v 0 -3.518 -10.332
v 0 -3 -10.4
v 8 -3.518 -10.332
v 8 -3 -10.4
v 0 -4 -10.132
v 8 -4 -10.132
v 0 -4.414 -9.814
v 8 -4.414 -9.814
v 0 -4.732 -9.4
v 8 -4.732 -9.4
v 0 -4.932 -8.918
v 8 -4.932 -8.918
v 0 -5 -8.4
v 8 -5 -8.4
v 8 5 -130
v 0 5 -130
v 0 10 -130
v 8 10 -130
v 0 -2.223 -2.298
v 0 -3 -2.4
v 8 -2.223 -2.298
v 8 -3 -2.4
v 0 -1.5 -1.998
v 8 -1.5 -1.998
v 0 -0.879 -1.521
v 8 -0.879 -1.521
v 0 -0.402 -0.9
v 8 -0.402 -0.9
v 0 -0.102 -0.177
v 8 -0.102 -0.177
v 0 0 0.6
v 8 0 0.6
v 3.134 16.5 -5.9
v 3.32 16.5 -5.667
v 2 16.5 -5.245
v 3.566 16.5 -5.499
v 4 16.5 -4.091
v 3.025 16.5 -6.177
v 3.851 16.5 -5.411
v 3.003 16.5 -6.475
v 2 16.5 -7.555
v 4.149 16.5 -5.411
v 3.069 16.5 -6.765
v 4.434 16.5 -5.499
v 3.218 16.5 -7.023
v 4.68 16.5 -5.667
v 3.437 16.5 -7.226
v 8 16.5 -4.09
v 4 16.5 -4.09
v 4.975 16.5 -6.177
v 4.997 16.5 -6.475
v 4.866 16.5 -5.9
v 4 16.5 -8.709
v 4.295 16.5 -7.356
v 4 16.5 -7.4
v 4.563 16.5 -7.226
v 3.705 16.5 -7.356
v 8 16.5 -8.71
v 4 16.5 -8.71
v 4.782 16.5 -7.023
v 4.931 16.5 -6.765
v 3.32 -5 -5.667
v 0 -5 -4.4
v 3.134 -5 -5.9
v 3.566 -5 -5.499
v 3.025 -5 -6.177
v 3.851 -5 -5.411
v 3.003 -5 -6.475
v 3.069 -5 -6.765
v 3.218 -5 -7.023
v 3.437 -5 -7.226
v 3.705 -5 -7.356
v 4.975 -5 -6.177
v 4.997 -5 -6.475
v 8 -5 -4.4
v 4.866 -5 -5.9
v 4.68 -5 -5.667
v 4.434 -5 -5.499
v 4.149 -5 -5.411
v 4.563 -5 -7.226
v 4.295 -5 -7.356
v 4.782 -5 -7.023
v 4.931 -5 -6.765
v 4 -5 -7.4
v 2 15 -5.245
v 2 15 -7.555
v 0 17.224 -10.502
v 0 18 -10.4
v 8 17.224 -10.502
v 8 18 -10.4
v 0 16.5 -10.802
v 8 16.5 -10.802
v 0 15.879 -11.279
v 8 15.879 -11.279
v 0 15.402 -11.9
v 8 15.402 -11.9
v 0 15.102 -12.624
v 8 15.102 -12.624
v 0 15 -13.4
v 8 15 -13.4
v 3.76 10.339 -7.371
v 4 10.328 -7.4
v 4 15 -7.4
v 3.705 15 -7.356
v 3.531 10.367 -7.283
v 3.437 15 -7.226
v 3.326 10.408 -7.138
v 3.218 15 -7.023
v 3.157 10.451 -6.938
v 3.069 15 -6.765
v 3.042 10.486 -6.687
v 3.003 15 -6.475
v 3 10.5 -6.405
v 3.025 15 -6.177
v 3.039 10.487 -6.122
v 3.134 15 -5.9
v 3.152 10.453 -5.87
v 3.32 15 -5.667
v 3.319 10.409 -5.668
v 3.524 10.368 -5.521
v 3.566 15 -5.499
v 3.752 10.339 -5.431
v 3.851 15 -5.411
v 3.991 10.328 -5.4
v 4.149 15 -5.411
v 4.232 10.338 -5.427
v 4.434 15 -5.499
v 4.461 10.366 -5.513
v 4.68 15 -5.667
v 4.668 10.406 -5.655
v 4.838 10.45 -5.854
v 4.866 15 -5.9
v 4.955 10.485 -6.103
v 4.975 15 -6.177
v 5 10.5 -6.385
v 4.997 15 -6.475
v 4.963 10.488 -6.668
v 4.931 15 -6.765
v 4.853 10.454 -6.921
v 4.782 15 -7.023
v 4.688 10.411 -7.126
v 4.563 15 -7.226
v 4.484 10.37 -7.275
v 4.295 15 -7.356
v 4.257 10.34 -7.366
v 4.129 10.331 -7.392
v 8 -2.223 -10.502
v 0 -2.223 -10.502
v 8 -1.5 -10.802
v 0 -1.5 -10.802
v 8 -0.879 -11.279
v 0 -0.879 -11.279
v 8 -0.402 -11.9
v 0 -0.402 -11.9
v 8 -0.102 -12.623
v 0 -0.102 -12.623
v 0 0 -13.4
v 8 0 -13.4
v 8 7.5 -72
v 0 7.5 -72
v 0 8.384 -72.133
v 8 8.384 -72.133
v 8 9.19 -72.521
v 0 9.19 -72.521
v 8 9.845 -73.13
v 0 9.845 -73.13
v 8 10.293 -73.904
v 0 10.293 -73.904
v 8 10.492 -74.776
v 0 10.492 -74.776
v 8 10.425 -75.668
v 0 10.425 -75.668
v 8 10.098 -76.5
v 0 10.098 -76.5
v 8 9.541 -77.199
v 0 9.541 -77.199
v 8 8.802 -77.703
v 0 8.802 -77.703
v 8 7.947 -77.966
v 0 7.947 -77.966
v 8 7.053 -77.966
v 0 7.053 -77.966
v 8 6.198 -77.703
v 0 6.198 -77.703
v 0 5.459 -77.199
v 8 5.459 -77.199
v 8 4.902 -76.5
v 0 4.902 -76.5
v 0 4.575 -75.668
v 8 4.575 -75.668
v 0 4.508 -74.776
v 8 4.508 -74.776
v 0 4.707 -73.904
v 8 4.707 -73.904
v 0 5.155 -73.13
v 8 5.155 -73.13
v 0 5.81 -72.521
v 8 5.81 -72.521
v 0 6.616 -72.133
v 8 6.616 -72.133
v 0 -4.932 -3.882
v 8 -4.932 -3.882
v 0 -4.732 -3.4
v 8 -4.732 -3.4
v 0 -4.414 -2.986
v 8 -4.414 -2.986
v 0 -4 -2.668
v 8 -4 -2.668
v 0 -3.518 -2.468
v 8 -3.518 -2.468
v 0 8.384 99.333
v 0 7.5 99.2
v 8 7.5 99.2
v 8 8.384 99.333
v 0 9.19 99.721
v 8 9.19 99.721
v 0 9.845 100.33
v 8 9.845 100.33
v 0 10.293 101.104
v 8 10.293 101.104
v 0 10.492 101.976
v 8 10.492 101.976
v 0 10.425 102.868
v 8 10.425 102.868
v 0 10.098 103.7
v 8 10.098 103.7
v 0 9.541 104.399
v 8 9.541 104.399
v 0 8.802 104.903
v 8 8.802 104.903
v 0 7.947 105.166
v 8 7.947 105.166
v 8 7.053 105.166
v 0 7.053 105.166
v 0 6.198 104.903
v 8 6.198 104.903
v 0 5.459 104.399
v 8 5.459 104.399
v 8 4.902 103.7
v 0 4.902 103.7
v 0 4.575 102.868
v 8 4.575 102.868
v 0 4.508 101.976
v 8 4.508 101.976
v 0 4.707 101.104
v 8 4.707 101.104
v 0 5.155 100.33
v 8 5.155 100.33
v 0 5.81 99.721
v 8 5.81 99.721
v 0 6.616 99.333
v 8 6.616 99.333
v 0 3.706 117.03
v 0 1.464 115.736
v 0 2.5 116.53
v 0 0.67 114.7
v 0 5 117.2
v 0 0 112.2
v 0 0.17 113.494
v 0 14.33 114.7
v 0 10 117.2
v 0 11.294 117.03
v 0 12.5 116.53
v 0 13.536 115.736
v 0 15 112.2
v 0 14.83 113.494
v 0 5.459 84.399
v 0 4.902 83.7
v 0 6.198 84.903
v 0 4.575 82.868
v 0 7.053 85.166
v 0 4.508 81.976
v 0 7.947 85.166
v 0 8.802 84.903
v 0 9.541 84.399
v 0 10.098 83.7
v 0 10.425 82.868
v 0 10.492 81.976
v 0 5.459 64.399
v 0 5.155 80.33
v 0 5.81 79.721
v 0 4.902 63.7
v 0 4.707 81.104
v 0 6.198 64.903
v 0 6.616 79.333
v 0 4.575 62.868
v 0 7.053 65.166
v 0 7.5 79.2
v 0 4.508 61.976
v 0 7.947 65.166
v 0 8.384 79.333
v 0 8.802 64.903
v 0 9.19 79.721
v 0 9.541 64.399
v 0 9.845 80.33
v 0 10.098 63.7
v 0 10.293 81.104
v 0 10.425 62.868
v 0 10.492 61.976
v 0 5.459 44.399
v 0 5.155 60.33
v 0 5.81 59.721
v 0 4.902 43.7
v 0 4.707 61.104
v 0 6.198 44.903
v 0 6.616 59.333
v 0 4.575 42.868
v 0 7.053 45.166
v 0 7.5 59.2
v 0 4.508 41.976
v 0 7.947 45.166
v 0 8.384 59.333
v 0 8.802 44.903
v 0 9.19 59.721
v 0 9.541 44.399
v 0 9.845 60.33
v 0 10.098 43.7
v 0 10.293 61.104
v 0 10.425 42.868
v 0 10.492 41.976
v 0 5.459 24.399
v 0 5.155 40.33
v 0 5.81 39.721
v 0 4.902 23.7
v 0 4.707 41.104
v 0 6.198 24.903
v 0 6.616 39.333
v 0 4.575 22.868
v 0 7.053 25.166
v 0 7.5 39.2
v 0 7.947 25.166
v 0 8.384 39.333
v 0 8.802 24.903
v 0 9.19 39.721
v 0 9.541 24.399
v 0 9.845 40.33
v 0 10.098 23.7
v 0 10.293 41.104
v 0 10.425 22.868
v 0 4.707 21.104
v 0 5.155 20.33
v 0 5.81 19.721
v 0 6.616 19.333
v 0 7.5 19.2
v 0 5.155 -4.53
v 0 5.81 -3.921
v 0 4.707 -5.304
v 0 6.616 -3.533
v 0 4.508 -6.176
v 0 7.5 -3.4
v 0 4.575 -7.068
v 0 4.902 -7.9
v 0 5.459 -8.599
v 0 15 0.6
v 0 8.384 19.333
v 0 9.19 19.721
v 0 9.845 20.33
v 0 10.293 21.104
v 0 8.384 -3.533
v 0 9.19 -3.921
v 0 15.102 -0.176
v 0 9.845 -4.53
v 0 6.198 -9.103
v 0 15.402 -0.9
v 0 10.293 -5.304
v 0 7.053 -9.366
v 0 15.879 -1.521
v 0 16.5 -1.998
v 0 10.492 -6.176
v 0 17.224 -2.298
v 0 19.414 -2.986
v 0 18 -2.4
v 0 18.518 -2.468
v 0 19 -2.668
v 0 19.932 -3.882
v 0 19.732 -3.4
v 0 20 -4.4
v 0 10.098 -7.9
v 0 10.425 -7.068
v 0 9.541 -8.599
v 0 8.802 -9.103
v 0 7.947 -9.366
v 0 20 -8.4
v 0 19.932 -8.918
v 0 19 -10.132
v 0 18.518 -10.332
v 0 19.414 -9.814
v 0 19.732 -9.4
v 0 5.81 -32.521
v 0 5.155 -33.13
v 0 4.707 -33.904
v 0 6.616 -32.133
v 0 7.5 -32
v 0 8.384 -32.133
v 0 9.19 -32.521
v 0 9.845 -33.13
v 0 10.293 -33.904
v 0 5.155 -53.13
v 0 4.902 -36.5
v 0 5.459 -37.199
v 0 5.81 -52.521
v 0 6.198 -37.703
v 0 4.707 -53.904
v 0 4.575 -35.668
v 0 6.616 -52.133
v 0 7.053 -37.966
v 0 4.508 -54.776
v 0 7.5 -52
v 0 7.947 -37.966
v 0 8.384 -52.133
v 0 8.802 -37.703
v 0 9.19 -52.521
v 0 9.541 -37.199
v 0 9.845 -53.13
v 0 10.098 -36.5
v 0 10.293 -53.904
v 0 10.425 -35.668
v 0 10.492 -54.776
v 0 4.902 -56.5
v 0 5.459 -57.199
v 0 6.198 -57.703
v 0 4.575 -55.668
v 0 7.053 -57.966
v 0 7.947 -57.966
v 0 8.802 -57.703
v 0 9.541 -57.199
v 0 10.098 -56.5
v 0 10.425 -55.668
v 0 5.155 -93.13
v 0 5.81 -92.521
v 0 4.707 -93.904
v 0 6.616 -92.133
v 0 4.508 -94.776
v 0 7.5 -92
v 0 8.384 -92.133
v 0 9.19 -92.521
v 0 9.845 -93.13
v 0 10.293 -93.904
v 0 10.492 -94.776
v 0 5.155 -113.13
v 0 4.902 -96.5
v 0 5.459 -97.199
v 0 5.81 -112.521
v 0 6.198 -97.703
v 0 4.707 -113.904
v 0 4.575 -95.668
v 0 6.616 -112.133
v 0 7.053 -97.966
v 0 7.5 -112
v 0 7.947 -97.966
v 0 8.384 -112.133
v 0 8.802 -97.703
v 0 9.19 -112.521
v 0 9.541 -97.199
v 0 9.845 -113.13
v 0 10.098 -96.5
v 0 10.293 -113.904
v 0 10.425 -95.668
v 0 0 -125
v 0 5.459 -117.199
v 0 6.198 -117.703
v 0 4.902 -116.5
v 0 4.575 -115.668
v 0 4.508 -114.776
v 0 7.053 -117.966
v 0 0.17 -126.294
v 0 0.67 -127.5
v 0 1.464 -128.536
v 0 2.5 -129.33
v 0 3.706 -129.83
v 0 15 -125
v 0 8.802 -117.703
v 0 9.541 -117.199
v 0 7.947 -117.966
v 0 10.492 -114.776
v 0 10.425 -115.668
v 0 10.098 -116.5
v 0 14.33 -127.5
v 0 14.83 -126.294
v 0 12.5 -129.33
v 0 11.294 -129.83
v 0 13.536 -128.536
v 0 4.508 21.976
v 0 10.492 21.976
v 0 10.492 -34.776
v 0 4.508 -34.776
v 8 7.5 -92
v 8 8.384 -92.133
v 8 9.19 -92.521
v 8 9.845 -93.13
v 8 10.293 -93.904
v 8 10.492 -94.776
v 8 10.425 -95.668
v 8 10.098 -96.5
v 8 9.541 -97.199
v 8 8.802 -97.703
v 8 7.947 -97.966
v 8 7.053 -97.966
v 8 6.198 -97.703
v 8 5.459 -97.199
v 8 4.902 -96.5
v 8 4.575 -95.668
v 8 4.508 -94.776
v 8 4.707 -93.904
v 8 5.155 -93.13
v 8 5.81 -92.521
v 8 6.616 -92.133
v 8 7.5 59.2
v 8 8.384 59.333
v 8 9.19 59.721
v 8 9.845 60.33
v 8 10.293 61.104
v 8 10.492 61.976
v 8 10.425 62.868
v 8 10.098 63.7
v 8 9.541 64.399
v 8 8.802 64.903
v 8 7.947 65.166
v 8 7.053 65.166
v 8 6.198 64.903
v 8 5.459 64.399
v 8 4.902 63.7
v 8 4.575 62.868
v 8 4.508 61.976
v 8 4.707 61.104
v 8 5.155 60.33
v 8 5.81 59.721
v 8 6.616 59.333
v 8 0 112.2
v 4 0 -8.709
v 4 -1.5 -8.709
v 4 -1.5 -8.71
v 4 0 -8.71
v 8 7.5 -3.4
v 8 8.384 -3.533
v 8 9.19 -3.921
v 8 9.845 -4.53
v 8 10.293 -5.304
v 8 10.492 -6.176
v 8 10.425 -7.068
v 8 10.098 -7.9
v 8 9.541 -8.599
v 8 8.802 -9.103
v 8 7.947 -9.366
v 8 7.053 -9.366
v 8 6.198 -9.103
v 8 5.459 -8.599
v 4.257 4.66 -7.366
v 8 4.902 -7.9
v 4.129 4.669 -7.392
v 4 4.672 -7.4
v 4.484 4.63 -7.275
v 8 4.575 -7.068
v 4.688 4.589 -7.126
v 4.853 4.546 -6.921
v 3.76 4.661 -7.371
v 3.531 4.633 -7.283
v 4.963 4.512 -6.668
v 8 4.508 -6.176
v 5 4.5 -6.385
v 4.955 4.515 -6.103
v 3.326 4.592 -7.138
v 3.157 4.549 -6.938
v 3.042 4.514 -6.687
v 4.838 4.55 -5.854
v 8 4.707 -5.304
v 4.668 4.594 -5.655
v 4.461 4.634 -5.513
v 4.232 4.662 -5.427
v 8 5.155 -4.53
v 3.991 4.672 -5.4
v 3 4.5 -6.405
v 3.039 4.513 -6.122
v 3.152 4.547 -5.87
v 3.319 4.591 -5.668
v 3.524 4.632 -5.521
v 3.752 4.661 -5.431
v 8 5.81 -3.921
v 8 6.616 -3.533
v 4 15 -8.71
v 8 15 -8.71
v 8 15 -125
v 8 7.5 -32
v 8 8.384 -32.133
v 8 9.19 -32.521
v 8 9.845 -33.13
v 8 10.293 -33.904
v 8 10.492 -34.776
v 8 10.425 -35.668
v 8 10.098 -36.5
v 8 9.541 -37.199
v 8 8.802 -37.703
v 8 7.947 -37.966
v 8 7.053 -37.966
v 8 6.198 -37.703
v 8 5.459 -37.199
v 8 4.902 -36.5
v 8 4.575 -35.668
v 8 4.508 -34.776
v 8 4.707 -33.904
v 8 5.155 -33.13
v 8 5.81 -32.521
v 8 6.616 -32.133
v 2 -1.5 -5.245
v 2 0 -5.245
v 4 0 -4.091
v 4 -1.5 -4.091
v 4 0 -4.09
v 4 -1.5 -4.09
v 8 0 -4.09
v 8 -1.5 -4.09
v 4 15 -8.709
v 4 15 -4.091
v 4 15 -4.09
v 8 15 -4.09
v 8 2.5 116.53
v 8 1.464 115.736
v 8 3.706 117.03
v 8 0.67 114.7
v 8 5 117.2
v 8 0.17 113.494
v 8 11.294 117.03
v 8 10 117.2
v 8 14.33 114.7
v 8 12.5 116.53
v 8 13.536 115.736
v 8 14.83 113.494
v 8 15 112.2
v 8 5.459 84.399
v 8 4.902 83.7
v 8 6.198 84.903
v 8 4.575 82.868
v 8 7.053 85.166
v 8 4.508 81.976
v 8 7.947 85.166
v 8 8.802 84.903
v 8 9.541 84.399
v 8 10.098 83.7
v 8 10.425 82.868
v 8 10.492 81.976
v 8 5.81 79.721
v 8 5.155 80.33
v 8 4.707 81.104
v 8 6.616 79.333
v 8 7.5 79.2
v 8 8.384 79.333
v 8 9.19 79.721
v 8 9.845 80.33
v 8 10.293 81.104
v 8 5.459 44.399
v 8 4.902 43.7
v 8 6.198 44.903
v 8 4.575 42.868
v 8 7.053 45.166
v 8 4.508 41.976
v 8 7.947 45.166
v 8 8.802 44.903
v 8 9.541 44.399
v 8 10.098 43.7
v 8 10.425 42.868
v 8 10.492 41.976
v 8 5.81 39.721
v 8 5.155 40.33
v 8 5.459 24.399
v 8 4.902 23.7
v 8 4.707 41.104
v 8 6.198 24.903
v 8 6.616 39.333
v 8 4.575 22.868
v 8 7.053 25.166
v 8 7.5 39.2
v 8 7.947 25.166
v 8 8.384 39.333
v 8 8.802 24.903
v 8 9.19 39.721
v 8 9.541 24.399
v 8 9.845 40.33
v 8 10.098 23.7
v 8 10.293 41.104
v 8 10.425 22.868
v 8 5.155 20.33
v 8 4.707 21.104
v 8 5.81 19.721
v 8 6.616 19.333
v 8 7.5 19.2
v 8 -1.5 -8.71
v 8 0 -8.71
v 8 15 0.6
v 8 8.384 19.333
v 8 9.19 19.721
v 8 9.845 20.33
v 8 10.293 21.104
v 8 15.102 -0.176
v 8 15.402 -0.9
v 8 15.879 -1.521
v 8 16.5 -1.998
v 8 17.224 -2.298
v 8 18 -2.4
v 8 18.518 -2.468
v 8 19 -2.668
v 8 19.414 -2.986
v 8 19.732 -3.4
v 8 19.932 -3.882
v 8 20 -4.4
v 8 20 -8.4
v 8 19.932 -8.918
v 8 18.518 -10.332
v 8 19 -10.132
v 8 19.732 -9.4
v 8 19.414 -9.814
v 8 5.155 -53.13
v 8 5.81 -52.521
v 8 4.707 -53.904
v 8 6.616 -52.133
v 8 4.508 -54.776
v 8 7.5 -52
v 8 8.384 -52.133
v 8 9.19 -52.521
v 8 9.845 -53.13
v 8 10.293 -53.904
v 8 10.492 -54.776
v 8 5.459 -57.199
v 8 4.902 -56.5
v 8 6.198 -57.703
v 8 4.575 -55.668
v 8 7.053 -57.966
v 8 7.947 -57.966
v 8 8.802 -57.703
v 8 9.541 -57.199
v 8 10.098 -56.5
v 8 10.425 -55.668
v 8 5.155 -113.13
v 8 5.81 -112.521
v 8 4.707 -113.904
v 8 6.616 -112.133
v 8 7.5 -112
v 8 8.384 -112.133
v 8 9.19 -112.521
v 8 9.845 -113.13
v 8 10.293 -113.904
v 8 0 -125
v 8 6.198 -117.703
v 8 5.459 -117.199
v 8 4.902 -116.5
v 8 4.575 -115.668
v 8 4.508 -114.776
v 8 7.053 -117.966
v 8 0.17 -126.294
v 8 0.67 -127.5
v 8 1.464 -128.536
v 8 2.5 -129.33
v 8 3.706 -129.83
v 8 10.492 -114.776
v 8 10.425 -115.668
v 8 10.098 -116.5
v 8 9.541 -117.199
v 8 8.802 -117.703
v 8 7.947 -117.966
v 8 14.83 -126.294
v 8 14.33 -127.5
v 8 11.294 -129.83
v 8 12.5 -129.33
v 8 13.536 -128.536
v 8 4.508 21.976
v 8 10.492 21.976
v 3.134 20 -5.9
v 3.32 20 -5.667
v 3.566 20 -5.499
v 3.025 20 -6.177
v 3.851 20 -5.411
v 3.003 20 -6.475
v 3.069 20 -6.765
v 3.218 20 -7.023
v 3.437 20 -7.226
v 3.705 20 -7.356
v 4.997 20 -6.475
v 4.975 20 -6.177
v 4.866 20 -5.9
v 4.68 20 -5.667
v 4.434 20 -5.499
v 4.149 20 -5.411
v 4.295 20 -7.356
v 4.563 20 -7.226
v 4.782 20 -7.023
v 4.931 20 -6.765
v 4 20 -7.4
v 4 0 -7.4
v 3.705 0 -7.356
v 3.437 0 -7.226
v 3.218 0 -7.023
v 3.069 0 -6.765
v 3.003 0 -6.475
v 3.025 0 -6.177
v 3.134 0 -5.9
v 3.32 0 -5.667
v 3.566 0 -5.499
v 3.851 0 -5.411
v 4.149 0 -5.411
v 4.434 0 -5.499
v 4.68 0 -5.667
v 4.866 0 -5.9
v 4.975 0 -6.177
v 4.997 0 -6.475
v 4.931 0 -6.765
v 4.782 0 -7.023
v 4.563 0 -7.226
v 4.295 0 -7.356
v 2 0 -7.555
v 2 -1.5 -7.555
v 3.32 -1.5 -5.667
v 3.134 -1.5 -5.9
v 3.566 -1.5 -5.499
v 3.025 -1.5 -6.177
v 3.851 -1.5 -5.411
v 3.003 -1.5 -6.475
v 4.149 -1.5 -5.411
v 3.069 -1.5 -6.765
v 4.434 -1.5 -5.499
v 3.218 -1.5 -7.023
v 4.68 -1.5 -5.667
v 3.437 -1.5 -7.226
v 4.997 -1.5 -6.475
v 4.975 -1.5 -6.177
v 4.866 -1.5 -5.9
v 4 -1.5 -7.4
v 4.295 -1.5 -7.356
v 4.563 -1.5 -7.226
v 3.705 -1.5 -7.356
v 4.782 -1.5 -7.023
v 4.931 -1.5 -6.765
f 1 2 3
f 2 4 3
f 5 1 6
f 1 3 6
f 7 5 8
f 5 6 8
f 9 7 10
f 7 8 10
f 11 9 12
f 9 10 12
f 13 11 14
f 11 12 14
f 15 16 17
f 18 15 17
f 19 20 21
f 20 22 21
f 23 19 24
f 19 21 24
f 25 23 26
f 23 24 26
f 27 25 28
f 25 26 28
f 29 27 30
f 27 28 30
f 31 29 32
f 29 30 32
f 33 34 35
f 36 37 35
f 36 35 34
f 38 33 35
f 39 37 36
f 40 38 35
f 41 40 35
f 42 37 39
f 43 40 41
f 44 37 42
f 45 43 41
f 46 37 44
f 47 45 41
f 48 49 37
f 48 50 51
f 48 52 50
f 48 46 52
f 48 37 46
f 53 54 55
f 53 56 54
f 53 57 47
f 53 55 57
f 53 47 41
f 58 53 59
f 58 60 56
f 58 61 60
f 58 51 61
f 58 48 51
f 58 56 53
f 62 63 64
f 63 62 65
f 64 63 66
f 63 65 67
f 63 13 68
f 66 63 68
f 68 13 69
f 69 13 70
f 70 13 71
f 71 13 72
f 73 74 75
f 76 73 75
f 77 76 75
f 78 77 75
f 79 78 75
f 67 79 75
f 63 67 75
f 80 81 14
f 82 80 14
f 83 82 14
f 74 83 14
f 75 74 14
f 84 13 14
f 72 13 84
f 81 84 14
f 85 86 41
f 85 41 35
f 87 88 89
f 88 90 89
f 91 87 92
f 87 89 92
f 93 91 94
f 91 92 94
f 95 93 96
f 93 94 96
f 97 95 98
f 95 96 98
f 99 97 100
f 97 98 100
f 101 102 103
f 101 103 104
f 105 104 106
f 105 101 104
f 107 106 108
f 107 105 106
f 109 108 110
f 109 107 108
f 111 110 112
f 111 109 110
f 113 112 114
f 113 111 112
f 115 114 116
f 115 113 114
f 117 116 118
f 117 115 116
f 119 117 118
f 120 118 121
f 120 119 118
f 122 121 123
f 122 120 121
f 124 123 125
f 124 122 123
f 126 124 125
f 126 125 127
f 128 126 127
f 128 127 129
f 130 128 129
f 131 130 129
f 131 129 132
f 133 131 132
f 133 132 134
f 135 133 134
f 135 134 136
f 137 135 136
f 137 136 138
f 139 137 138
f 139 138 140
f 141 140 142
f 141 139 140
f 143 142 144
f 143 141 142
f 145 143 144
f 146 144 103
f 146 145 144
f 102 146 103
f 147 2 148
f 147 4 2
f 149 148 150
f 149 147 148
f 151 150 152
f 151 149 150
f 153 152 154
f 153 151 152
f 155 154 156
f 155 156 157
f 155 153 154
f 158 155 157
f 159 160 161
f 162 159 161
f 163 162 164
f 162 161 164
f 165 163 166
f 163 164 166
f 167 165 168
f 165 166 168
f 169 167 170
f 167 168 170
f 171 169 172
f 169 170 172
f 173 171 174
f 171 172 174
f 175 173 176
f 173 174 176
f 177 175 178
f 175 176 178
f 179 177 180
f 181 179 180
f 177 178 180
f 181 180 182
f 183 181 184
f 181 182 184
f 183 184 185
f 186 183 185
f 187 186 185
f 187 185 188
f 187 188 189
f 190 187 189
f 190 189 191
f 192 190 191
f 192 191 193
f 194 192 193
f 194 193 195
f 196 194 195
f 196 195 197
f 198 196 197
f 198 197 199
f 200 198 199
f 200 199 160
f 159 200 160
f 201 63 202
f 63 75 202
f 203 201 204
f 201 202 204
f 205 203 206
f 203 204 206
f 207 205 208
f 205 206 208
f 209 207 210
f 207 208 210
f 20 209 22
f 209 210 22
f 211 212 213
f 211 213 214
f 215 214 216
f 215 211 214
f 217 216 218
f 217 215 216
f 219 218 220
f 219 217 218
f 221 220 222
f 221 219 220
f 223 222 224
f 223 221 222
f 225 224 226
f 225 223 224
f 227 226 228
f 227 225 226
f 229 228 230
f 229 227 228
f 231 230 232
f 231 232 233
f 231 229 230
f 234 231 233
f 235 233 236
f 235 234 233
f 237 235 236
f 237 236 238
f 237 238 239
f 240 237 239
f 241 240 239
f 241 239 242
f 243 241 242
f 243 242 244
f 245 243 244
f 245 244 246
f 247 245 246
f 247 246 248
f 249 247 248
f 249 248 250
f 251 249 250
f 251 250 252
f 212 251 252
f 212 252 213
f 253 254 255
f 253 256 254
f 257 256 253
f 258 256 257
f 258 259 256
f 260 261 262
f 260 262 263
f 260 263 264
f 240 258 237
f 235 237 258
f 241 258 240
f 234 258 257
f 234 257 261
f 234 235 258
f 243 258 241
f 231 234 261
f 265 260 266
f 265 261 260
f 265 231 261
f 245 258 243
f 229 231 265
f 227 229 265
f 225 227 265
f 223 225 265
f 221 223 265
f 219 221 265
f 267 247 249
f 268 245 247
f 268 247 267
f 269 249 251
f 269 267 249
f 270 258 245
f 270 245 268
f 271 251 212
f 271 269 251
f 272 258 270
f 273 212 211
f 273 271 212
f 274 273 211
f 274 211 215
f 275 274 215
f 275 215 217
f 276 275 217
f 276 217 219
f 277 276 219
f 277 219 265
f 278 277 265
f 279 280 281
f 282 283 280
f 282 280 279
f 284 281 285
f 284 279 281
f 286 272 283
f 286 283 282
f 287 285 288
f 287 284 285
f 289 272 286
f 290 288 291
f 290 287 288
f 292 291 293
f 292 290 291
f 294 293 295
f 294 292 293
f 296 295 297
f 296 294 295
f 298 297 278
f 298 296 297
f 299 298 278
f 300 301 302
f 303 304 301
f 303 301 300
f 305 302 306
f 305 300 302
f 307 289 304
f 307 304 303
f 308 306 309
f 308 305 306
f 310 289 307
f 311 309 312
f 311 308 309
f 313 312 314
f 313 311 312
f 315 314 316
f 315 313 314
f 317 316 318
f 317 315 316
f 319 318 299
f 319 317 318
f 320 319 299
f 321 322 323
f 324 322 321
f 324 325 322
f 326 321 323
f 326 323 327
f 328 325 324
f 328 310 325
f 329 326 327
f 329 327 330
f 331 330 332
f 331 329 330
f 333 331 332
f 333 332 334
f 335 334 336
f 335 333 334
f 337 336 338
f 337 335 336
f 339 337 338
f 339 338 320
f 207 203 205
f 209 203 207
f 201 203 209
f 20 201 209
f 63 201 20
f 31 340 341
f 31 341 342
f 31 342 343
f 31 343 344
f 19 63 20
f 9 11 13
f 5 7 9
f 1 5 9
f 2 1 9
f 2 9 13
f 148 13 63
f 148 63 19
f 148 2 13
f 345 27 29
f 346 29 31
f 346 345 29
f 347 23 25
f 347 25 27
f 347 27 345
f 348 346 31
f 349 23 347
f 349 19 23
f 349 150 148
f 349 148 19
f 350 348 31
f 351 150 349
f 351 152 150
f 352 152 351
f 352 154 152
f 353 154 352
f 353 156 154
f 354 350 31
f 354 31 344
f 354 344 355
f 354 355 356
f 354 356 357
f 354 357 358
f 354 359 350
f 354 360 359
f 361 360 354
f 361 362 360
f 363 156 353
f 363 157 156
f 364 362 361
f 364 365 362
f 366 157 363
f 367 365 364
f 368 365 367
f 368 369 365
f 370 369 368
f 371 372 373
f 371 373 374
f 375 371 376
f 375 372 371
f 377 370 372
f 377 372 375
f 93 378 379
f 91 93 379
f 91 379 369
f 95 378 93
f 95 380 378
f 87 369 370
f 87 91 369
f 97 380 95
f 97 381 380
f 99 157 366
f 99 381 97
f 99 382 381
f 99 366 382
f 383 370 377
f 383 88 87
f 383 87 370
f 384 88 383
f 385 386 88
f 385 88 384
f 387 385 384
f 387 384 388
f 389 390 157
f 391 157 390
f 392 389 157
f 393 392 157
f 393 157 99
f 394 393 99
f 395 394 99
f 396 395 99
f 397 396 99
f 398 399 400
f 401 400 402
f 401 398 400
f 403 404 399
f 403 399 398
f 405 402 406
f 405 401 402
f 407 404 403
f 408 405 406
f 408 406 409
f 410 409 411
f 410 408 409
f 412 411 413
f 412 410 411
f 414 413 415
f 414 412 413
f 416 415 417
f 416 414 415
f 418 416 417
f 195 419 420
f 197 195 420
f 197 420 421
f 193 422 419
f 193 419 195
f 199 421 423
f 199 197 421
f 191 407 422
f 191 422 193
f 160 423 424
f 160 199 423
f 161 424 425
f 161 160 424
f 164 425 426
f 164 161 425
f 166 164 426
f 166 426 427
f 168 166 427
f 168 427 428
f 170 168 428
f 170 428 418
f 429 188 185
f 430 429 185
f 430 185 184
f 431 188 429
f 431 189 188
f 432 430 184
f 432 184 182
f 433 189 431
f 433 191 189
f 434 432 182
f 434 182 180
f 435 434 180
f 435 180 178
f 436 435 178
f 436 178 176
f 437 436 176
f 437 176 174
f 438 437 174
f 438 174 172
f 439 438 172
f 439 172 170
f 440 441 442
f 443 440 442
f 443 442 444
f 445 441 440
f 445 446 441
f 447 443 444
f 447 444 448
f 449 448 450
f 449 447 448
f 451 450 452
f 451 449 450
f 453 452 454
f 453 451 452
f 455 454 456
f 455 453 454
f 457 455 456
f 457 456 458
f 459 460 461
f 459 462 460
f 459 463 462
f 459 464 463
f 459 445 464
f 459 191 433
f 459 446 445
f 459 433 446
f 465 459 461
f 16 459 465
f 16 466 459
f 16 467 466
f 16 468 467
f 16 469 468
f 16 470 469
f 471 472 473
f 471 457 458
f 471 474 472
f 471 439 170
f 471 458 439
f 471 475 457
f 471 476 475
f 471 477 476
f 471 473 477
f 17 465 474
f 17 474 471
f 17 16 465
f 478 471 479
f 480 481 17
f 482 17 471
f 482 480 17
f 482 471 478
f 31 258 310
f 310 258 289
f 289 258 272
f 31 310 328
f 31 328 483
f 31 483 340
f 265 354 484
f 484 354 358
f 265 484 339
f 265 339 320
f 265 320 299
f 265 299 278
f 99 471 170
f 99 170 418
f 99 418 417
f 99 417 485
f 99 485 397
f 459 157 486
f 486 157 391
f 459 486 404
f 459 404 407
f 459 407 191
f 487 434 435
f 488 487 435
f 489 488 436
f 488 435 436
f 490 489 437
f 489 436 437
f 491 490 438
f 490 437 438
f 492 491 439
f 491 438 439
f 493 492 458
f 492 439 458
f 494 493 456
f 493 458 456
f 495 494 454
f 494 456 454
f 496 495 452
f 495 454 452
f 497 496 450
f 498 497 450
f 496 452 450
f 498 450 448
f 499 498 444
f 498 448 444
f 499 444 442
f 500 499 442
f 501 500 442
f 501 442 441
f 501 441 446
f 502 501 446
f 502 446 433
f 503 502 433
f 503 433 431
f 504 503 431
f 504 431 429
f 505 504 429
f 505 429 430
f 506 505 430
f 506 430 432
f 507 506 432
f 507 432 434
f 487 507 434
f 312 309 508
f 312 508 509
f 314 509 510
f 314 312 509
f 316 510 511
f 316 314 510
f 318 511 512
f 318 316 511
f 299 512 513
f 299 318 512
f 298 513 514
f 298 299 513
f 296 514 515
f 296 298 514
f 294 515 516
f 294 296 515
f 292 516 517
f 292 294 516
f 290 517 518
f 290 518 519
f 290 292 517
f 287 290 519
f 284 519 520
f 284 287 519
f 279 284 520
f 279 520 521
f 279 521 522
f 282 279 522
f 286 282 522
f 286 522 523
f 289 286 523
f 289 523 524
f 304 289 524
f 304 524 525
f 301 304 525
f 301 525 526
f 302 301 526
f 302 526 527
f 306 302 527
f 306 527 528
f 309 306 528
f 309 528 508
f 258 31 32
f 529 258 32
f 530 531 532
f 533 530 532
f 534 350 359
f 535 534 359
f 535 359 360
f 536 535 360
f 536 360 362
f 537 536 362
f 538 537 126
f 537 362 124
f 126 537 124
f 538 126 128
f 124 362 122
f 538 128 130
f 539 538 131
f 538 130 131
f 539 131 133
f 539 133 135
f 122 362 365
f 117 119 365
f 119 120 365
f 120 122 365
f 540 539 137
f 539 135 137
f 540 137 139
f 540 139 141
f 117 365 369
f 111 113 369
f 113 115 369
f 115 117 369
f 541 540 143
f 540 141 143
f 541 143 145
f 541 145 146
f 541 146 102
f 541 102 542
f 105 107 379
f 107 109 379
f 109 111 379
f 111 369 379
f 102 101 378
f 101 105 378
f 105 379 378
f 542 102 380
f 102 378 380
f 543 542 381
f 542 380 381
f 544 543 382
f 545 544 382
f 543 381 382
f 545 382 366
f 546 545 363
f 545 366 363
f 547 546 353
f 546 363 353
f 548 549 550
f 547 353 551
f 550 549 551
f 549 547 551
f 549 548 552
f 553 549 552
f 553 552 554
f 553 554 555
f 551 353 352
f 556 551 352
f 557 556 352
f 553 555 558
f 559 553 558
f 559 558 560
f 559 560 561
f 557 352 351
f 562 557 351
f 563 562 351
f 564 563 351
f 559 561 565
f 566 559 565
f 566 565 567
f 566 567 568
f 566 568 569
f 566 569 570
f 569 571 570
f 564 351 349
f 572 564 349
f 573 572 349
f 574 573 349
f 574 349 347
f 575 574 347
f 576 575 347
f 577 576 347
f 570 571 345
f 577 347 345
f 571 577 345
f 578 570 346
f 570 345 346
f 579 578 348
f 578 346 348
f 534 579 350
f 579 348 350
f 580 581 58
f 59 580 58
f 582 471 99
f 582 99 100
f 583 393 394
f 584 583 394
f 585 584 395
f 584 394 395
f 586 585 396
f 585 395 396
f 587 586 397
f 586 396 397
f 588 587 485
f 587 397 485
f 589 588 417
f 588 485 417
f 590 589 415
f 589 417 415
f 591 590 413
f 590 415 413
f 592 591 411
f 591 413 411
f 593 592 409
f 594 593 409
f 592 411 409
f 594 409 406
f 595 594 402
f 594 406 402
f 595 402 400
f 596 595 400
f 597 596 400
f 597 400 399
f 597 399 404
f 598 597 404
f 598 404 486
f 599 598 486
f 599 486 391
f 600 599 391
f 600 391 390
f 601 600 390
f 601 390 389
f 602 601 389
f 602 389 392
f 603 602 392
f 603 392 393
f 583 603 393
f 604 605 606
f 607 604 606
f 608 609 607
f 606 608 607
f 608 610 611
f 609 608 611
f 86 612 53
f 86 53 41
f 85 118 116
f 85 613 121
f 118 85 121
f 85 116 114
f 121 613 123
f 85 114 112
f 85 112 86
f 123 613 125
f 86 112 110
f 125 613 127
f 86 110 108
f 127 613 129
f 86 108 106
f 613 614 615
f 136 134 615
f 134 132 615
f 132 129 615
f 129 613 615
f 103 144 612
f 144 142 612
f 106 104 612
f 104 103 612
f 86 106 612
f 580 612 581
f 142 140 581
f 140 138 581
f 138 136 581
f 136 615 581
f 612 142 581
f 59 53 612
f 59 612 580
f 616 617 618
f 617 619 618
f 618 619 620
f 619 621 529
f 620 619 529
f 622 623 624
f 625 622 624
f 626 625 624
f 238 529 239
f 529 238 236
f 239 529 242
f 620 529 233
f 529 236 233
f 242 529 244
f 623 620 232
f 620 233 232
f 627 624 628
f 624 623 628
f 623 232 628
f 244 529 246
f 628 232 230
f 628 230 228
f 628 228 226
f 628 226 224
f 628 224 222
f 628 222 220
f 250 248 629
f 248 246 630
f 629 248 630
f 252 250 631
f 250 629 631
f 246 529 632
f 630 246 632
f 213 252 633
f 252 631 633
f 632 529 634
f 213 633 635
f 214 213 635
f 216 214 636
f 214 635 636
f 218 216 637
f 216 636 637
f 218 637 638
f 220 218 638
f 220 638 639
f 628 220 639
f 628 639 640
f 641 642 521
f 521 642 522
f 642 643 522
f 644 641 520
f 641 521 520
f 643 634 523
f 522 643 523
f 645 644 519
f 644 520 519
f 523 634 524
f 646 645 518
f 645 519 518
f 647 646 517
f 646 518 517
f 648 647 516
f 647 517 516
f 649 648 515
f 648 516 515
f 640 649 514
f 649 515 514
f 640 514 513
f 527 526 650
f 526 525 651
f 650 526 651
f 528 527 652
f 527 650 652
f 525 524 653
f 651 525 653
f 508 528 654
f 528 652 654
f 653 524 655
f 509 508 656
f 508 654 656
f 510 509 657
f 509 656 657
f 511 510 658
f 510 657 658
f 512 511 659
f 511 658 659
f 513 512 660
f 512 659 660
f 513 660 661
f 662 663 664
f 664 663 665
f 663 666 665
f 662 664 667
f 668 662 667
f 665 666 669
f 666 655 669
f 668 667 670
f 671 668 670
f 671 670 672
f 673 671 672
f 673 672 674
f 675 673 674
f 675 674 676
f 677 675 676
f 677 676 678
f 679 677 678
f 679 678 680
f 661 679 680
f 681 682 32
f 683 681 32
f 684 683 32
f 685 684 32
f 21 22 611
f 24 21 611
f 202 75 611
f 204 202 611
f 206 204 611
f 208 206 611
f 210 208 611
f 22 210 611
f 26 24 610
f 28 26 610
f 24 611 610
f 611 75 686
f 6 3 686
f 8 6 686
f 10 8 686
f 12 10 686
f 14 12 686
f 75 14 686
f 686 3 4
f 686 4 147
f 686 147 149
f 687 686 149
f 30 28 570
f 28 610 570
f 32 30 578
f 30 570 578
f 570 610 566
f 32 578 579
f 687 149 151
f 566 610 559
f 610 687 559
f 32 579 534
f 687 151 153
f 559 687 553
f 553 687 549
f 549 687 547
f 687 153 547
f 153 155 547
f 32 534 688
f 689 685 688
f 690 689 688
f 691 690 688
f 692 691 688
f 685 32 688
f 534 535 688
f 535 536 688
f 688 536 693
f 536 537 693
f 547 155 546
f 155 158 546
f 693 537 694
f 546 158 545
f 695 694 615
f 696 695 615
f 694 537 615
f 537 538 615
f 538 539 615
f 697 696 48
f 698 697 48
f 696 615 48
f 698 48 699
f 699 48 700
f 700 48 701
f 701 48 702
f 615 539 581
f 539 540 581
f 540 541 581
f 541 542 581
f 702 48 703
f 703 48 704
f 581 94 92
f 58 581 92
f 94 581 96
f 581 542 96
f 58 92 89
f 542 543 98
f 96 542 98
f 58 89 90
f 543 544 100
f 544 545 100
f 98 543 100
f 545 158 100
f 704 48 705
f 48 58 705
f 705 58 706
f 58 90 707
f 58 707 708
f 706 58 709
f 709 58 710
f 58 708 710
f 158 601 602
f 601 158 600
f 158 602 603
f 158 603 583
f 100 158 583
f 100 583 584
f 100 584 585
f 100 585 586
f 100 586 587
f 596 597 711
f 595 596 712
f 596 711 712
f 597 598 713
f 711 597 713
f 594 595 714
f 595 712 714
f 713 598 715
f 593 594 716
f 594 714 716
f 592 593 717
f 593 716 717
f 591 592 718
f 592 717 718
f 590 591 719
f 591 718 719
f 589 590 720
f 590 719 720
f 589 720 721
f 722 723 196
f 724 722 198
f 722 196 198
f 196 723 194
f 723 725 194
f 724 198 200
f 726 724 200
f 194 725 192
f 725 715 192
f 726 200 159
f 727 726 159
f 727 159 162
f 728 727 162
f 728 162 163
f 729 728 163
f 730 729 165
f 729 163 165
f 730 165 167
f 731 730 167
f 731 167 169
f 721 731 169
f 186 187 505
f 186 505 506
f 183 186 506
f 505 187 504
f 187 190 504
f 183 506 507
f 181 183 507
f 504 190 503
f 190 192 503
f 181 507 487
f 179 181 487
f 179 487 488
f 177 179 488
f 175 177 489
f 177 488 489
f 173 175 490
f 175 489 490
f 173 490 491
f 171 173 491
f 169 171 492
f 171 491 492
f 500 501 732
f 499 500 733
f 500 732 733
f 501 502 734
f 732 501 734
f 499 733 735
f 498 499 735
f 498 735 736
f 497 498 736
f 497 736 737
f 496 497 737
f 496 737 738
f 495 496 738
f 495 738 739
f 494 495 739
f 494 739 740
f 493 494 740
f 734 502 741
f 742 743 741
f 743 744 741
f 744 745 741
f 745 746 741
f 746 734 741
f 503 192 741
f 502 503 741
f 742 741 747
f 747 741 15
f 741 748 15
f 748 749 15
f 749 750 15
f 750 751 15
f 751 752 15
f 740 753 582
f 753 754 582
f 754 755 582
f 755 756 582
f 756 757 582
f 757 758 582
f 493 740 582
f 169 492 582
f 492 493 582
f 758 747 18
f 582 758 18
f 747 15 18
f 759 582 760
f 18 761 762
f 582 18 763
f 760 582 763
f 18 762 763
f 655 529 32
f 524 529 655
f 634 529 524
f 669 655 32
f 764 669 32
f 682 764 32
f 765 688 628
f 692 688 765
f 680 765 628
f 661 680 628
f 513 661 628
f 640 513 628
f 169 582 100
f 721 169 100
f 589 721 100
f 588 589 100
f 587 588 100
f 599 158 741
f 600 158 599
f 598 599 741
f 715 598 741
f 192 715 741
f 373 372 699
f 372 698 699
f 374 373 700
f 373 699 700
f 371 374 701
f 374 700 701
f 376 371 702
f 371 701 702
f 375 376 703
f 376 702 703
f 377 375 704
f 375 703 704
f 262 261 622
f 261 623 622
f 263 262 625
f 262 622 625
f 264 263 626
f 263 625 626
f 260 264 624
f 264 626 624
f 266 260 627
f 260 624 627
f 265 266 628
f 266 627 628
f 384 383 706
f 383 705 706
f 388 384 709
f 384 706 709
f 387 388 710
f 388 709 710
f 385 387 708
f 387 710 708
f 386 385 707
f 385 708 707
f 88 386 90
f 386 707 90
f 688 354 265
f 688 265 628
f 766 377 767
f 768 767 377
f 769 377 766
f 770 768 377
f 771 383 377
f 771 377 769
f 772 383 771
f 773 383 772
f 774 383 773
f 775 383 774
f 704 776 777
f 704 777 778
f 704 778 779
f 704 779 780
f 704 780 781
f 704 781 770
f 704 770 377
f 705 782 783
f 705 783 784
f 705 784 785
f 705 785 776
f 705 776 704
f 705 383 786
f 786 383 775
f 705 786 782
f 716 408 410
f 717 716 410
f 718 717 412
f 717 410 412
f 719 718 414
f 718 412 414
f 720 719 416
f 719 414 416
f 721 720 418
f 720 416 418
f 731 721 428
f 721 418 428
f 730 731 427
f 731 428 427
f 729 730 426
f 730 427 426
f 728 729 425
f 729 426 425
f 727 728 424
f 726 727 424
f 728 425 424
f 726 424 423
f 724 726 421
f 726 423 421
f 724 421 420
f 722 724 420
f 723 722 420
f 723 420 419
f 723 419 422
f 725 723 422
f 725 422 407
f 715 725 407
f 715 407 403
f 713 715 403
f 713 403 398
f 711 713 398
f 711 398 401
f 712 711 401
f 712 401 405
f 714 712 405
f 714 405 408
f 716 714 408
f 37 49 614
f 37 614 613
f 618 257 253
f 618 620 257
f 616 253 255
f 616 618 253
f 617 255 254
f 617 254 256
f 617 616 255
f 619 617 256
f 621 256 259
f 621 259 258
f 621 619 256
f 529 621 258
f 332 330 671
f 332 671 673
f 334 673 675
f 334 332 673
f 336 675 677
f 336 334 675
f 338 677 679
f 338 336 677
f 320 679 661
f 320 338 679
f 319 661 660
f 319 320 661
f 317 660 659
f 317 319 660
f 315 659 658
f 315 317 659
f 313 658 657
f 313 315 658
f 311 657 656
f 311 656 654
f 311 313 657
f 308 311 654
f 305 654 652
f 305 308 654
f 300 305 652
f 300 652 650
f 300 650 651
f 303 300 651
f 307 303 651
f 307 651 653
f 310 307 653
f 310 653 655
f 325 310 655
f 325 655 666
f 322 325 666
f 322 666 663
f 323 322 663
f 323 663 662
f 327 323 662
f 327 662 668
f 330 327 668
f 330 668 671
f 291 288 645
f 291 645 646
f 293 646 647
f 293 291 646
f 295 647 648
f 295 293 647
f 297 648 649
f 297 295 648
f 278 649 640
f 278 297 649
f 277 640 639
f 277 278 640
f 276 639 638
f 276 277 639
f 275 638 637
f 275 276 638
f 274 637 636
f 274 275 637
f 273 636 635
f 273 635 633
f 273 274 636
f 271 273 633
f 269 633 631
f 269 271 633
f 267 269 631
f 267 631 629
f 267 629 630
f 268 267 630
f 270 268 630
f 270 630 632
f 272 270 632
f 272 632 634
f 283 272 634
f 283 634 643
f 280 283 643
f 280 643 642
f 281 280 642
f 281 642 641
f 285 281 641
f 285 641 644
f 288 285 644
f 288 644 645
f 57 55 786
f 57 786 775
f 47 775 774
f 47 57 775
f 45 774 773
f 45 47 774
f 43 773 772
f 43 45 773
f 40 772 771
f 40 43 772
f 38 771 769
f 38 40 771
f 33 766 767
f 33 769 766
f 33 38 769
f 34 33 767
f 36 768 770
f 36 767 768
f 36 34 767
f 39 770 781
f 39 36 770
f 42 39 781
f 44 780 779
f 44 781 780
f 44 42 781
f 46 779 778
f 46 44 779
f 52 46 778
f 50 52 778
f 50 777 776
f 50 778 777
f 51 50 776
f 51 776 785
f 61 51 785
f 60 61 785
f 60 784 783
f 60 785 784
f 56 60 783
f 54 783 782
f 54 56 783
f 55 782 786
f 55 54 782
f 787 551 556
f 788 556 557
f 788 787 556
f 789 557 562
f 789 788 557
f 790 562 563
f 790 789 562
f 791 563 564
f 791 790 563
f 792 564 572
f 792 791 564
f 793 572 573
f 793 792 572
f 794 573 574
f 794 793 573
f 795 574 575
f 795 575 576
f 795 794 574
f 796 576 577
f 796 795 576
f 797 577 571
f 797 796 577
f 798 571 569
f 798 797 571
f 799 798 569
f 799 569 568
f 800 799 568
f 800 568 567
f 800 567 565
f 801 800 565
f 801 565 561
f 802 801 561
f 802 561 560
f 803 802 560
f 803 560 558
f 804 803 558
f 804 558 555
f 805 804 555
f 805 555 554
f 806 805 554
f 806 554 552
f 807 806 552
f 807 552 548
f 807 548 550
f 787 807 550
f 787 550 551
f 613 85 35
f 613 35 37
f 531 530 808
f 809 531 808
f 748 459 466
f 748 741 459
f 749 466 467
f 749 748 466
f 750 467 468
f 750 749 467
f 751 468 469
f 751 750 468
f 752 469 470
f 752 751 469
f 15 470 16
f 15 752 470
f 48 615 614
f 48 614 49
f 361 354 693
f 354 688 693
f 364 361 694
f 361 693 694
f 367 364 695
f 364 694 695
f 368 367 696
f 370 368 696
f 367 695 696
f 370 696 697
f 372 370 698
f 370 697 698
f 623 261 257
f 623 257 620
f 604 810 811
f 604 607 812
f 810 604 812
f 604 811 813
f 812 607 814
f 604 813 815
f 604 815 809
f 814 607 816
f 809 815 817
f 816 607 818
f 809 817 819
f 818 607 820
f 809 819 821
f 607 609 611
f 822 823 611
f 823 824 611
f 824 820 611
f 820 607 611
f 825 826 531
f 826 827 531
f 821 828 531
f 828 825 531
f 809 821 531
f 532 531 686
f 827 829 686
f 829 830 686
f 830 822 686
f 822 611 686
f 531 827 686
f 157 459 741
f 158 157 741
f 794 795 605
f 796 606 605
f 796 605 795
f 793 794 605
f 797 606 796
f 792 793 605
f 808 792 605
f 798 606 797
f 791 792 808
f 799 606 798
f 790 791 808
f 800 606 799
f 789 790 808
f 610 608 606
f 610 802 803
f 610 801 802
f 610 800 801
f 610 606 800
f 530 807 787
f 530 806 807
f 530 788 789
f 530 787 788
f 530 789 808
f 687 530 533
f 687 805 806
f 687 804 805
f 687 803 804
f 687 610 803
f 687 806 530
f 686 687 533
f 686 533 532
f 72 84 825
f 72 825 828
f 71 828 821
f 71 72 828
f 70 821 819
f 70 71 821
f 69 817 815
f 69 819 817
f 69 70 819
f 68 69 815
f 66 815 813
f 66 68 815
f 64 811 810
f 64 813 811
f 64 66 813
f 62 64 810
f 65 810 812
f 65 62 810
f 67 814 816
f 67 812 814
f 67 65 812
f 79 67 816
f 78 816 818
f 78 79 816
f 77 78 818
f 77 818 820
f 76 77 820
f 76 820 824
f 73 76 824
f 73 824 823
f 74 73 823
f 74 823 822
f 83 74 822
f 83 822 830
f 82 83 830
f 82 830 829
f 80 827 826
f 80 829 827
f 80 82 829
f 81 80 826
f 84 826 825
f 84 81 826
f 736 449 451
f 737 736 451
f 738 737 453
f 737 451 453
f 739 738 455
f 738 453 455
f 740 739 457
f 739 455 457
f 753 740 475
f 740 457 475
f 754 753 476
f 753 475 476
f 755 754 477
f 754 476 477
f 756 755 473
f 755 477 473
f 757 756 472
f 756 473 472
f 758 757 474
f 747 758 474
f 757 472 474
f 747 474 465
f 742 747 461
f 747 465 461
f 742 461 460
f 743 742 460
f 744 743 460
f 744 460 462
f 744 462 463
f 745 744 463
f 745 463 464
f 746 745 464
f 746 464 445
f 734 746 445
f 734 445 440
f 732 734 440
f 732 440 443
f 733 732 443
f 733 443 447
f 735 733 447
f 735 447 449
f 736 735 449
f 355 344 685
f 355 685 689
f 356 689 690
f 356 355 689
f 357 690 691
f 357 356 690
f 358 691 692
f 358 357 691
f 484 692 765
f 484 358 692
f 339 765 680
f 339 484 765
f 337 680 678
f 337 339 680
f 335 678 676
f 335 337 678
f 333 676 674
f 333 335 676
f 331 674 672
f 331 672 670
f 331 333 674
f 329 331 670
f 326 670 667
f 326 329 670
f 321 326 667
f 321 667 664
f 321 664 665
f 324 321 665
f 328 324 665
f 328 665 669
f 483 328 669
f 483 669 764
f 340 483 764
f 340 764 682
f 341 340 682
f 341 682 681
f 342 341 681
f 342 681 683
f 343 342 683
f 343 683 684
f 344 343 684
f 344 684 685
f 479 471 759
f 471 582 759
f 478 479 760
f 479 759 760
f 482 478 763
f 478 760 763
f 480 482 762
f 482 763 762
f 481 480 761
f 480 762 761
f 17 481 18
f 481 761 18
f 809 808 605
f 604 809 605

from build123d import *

# Parameters (mm, degrees)
SKETCH_1_W                = 130
SKETCH_1_H                = 15
EXTRUDE_1_DEPTH           = 8
CUT_EXTRUDE_10_REACH      = 133.107
SKETCH_17_R               = 3
SKETCH_19_W               = 8
SKETCH_19_H               = 15
EXTRUDE_6_DEPTH           = 117.2
FILLET_1_R                = 5
CUT_EXTRUDE_12_REACH      = 133.107
SKETCH_15_R               = 3
SKETCH_22_W               = 8
SKETCH_22_H               = 8
EXTRUDE_7_DEPTH           = 5
CUT_EXTRUDE_18_DEPTH      = 1.5
SKETCH_25_W               = 4.62
SKETCH_25_H               = 1.5
CUT_EXTRUDE_19_DEPTH      = 4
FILLET_8_R                = 3
FILLET_9_R                = 2
FILLET_10_R               = 2
FILLET_11_R               = 3
CUT_EXTRUDE_20_DEPTH      = 15.5
CUT_EXTRUDE_20_DEPTH_BACK = 28.5
SKETCH_21_R               = 1


with BuildPart() as part:
    # 草图1 → 凸台-拉伸1 (new body)
    with BuildSketch(Plane(origin=(0, 0, 0), x_dir=(0, 0, -1), z_dir=(1, 0, 0))):
        with Locations((65, 7.5)):
            Rectangle(SKETCH_1_W, SKETCH_1_H)
    extrude(amount=EXTRUDE_1_DEPTH)

    # 草图17 → 切除-拉伸10 (cut, up to next)
    with BuildSketch(Plane.ZY, mode=Mode.PRIVATE) as cut_extrude_10_sk1:
        with Locations((-115, 7.5)):
            Circle(SKETCH_17_R)
    cut_extrude_10_tool1 = extrude(cut_extrude_10_sk1.sketch, amount=-CUT_EXTRUDE_10_REACH, mode=Mode.PRIVATE) & part.part
    # 草图17 → 切除-拉伸10 (cut, up to next)
    with BuildSketch(Plane.ZY, mode=Mode.PRIVATE) as cut_extrude_10_sk2:
        with Locations((-95, 7.5)):
            Circle(SKETCH_17_R)
    cut_extrude_10_tool2 = extrude(cut_extrude_10_sk2.sketch, amount=-CUT_EXTRUDE_10_REACH, mode=Mode.PRIVATE) & part.part
    # 草图17 → 切除-拉伸10 (cut, up to next)
    with BuildSketch(Plane.ZY, mode=Mode.PRIVATE) as cut_extrude_10_sk3:
        with Locations((-75, 7.5)):
            Circle(SKETCH_17_R)
    cut_extrude_10_tool3 = extrude(cut_extrude_10_sk3.sketch, amount=-CUT_EXTRUDE_10_REACH, mode=Mode.PRIVATE) & part.part
    # 草图17 → 切除-拉伸10 (cut, up to next)
    with BuildSketch(Plane.ZY, mode=Mode.PRIVATE) as cut_extrude_10_sk4:
        with Locations((-55, 7.5)):
            Circle(SKETCH_17_R)
    cut_extrude_10_tool4 = extrude(cut_extrude_10_sk4.sketch, amount=-CUT_EXTRUDE_10_REACH, mode=Mode.PRIVATE) & part.part
    # 草图17 → 切除-拉伸10 (cut, up to next)
    with BuildSketch(Plane.ZY, mode=Mode.PRIVATE) as cut_extrude_10_sk5:
        with Locations((-35, 7.5)):
            Circle(SKETCH_17_R)
    cut_extrude_10_tool5 = extrude(cut_extrude_10_sk5.sketch, amount=-CUT_EXTRUDE_10_REACH, mode=Mode.PRIVATE) & part.part
    cut_extrude_10_1 = cut_extrude_10_tool1.solids().sort_by_distance((0, 7.5, -115))[0]
    add(cut_extrude_10_1, mode=Mode.SUBTRACT)
    cut_extrude_10_2 = cut_extrude_10_tool2.solids().sort_by_distance((0, 7.5, -95))[0]
    add(cut_extrude_10_2, mode=Mode.SUBTRACT)
    cut_extrude_10_3 = cut_extrude_10_tool3.solids().sort_by_distance((0, 7.5, -75))[0]
    add(cut_extrude_10_3, mode=Mode.SUBTRACT)
    cut_extrude_10_4 = cut_extrude_10_tool4.solids().sort_by_distance((0, 7.5, -55))[0]
    add(cut_extrude_10_4, mode=Mode.SUBTRACT)
    cut_extrude_10_5 = cut_extrude_10_tool5.solids().sort_by_distance((0, 7.5, -35))[0]
    add(cut_extrude_10_5, mode=Mode.SUBTRACT)
    cut_extrude_10 = cut_extrude_10_1 + cut_extrude_10_2 + cut_extrude_10_3 + cut_extrude_10_4 + cut_extrude_10_5  # 切除-拉伸10 as one shape, for the pattern or mirror that repeats it

    # 草图19 → 凸台-拉伸6 (add)
    with BuildSketch(Plane.XY):
        with Locations((4, 7.5)):
            Rectangle(SKETCH_19_W, SKETCH_19_H)
    extrude(amount=EXTRUDE_6_DEPTH)

    # 镜向1: 切除-拉伸10 across plane
    add(cut_extrude_10.mirror(Plane.XY.offset(-6.4)), mode=Mode.SUBTRACT)

    # 圆角1
    fillet_1_edges = [part.edges().sort_by_distance(p)[0] for p in [
        (4, 0, 117.2),
        (4, 15, 117.2),
        (4, 15, -130),
        (4, 0, -130),
    ]]
    fillet(fillet_1_edges, radius=FILLET_1_R)

    # 草图15 → 切除-拉伸12 (cut, up to next)
    with BuildSketch(Plane.ZY, mode=Mode.PRIVATE) as cut_extrude_12_sk1:
        with Locations((-6.4, 7.5)):
            Circle(SKETCH_15_R)
    cut_extrude_12_tool1 = extrude(cut_extrude_12_sk1.sketch, amount=-CUT_EXTRUDE_12_REACH, mode=Mode.PRIVATE) & part.part
    add(cut_extrude_12_tool1.solids().sort_by_distance((0, 7.5, -6.4))[0], mode=Mode.SUBTRACT)

    # 草图22 → 凸台-拉伸7 (add)
    with BuildSketch(Plane(origin=(0, 15, 0), x_dir=(1, 0, 0), z_dir=(0, 1, 0))):
        with Locations((4, 6.4)):
            Rectangle(SKETCH_22_W, SKETCH_22_H)
    extrude_7 = extrude(amount=EXTRUDE_7_DEPTH)

    # 草图24 → 切除-拉伸18 (cut)
    with BuildSketch(Plane(origin=(0, 15, 0), x_dir=(1, 0, 0), z_dir=(0, 1, 0))):
        Polygon((4, 4.090598923), (6, 5.245299462), (6, 7.554700538), (4, 8.709401077), (2, 7.554700538), (2, 5.245299462), align=None)
    cut_extrude_18 = extrude(amount=CUT_EXTRUDE_18_DEPTH, mode=Mode.SUBTRACT)

    # 草图25 → 切除-拉伸19 (cut)
    with BuildSketch(Plane(origin=(8, 0, 0), x_dir=(0, 0, -1), z_dir=(1, 0, 0))):
        with Locations((6.4, 15.75)):
            Rectangle(SKETCH_25_W, SKETCH_25_H)
    cut_extrude_19 = extrude(amount=-CUT_EXTRUDE_19_DEPTH, mode=Mode.SUBTRACT)

    # 圆角8
    fillet_8_edges = [part.edges().sort_by_distance(p)[0] for p in [
        (4, 15, -2.4),
        (4, 15, -10.4),
    ]]
    fillet(fillet_8_edges, radius=FILLET_8_R)

    # 圆角9
    fillet_9_edges = [part.edges().sort_by_distance(p)[0] for p in [
        (4, 20, -2.4),
        (4, 20, -10.4),
    ]]
    fillet(fillet_9_edges, radius=FILLET_9_R - 0.0001)  # a hair under: the kernel refuses the full size

    # 镜向6: 凸台-拉伸7, 切除-拉伸18, 切除-拉伸19 across plane
    add(extrude_7.mirror(Plane.ZX.offset(7.5)))
    add(cut_extrude_18.mirror(Plane.ZX.offset(7.5)), mode=Mode.SUBTRACT)
    add(cut_extrude_19.mirror(Plane.ZX.offset(7.5)), mode=Mode.SUBTRACT)

    # 圆角10
    fillet_10_edges = [part.edges().sort_by_distance(p)[0] for p in [
        (4, -5, -10.4),
        (4, -5, -2.4),
    ]]
    fillet(fillet_10_edges, radius=FILLET_10_R)

    # 圆角11
    fillet_11_edges = [part.edges().sort_by_distance(p)[0] for p in [
        (4, 0, -2.4),
        (4, 0, -10.4),
    ]]
    fillet(fillet_11_edges, radius=FILLET_11_R - 0.0001)  # a hair under: the kernel refuses the full size

    # 草图21 → 切除-拉伸20 (cut, two sides: drawn at the far end of the back side and taken through both)
    with BuildSketch(Plane(origin=(0, 15, 0), x_dir=(1, 0, 0), z_dir=(0, 1, 0)).offset(-CUT_EXTRUDE_20_DEPTH_BACK)):
        with Locations(Location((4, 6.4, 0), (0, 0, 90))):
            Circle(SKETCH_21_R)
    extrude(amount=CUT_EXTRUDE_20_DEPTH + CUT_EXTRUDE_20_DEPTH_BACK, mode=Mode.SUBTRACT)


solid = part.part
